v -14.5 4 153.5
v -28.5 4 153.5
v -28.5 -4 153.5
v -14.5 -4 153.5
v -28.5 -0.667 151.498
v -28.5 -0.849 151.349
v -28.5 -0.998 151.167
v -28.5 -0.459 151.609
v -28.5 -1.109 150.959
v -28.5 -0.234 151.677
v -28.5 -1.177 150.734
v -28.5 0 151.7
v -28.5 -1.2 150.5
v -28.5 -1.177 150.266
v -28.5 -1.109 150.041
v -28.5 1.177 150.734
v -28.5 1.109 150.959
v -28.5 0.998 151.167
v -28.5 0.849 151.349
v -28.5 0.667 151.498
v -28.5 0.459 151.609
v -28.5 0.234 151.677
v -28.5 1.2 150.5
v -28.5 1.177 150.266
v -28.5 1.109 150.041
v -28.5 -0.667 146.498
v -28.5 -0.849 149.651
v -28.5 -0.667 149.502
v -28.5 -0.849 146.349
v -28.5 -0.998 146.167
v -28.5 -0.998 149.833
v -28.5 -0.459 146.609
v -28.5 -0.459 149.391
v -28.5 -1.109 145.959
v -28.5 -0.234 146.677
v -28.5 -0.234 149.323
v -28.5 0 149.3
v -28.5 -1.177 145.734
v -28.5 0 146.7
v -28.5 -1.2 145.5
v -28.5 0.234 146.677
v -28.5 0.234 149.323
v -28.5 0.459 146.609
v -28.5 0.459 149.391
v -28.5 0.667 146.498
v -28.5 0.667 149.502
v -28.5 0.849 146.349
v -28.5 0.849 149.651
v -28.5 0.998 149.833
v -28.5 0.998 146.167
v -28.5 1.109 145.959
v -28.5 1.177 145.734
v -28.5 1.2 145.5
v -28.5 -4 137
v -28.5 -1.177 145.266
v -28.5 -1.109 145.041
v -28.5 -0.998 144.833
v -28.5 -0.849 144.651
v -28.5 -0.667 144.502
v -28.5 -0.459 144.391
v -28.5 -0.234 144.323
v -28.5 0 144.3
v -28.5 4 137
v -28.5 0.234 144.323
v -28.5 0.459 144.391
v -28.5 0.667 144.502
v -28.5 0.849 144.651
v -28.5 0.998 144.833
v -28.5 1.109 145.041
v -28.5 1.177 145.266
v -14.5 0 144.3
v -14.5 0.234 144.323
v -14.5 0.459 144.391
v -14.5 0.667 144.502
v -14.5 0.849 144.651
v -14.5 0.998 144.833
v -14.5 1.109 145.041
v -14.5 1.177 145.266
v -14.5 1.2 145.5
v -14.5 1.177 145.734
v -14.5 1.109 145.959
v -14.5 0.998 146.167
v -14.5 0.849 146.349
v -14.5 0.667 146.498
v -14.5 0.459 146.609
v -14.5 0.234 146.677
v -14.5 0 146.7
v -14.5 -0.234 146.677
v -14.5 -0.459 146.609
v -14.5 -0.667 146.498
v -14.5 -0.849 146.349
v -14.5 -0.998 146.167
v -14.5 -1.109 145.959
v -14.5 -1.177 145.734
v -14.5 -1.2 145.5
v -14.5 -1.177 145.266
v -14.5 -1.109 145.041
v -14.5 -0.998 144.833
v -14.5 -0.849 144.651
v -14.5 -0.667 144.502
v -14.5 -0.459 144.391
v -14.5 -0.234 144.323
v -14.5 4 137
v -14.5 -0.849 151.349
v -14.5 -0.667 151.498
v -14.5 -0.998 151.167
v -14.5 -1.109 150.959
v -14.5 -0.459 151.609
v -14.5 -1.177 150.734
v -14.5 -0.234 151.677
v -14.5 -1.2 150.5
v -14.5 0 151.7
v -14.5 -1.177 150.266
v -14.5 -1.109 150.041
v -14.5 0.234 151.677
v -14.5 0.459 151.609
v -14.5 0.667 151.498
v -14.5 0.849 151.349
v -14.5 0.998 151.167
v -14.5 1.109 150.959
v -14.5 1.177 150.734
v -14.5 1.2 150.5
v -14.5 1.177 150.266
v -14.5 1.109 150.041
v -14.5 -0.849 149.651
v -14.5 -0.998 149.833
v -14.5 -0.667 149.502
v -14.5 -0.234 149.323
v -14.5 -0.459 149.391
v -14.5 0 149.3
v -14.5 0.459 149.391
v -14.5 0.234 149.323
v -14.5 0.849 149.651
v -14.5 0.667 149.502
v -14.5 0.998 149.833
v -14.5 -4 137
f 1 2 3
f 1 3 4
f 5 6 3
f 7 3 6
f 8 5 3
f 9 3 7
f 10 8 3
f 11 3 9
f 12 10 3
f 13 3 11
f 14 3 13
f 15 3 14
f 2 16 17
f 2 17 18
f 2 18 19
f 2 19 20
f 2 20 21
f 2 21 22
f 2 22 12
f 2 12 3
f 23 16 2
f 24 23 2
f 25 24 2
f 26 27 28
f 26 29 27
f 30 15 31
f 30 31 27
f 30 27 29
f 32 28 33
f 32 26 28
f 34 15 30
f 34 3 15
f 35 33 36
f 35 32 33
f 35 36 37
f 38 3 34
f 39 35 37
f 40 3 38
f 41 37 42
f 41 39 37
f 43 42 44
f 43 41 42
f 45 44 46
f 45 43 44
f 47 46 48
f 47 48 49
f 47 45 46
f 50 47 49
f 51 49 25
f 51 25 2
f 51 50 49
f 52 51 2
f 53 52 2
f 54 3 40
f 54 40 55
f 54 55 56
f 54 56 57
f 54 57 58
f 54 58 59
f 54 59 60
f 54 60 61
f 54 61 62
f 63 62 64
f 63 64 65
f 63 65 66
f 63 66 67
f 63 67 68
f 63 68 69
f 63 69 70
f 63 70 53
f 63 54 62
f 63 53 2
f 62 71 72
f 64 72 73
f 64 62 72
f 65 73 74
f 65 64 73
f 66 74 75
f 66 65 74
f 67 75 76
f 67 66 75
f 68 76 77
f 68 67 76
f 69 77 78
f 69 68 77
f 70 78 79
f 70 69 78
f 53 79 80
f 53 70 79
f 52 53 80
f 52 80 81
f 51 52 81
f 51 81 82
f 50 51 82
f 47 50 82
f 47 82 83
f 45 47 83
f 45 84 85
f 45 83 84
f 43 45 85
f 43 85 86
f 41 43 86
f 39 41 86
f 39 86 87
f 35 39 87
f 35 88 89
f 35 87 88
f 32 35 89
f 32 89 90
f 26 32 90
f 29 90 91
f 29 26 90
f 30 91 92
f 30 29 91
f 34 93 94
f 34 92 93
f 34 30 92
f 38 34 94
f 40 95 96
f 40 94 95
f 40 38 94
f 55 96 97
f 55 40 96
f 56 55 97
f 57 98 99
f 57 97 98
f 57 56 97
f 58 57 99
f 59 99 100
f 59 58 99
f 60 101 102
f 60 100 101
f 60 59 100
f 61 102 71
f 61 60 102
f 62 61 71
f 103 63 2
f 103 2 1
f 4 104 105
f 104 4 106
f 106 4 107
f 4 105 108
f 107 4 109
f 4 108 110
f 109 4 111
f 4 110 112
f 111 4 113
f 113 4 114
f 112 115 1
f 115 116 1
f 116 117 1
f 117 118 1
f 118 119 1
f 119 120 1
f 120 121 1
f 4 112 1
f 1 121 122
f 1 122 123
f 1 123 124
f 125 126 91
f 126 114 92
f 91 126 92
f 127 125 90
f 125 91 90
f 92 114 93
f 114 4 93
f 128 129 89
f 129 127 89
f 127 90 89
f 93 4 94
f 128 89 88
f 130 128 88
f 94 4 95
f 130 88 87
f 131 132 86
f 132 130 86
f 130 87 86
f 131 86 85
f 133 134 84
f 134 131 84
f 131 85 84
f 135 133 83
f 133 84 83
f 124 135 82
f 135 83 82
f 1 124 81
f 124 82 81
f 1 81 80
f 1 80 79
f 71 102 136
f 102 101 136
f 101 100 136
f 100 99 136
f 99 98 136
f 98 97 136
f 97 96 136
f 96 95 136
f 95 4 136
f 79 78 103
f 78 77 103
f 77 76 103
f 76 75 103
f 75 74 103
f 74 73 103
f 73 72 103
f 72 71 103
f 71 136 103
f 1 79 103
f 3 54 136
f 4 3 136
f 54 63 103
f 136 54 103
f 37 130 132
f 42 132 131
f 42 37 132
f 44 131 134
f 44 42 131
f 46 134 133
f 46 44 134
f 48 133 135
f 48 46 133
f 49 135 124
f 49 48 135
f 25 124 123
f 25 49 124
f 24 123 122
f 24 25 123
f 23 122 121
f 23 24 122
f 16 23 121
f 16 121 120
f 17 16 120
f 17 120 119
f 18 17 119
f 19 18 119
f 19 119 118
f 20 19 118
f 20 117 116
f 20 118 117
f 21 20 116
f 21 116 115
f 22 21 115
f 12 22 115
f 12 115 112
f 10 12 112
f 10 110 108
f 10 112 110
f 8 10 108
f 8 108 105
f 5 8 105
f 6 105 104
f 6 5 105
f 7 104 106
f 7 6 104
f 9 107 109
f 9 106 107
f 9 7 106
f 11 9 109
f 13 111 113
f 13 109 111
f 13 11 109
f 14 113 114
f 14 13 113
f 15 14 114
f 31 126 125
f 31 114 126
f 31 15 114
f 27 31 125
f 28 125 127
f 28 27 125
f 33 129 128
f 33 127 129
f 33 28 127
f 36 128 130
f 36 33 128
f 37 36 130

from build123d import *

# Parameters (mm, degrees)
CYLINDER026_R     = 1.2
CYLINDER026_DEPTH = 18.5
CYLINDER027_R     = 1.2
CYLINDER027_DEPTH = 18.5
BOX022_W          = 14
BOX022_H          = 8
BOX022_DEPTH      = 16.5


with BuildPart() as safetybuttonshookscrewcutter:
    # Cylinder026 → Cylinder026 (new body)
    with BuildSketch(Plane(origin=(-28.5, 0, 150.5), x_dir=(0, 0, -1), z_dir=(1, 0, 0))):
        Circle(CYLINDER026_R)
    extrude(amount=CYLINDER026_DEPTH)


with BuildPart() as safetybuttonhookescrewcutters:
    # Cylinder027 → Cylinder027 (new body)
    with BuildSketch(Plane(origin=(-28.5, 0, 145.5), x_dir=(0, 0, -1), z_dir=(1, 0, 0))):
        Circle(CYLINDER027_R)
    extrude(amount=CYLINDER027_DEPTH)

    # Fusion013: union SafetyButtonsHookScrewCutter
    add(safetybuttonshookscrewcutter.part)


with BuildPart() as safetybuttonimpressor1:
    # Box022 → Box022 (new body)
    with BuildSketch(Plane(origin=(-28.5, -4, 137), x_dir=(1, 0, 0), z_dir=(0, 0, 1))):
        with Locations((7, 4)):
            Rectangle(BOX022_W, BOX022_H)
    extrude(amount=BOX022_DEPTH)

    # Cut051: cut SafetyButtonHookeScrewCutters
    add(safetybuttonhookescrewcutters.part, mode=Mode.SUBTRACT)


solid = safetybuttonimpressor1.part
